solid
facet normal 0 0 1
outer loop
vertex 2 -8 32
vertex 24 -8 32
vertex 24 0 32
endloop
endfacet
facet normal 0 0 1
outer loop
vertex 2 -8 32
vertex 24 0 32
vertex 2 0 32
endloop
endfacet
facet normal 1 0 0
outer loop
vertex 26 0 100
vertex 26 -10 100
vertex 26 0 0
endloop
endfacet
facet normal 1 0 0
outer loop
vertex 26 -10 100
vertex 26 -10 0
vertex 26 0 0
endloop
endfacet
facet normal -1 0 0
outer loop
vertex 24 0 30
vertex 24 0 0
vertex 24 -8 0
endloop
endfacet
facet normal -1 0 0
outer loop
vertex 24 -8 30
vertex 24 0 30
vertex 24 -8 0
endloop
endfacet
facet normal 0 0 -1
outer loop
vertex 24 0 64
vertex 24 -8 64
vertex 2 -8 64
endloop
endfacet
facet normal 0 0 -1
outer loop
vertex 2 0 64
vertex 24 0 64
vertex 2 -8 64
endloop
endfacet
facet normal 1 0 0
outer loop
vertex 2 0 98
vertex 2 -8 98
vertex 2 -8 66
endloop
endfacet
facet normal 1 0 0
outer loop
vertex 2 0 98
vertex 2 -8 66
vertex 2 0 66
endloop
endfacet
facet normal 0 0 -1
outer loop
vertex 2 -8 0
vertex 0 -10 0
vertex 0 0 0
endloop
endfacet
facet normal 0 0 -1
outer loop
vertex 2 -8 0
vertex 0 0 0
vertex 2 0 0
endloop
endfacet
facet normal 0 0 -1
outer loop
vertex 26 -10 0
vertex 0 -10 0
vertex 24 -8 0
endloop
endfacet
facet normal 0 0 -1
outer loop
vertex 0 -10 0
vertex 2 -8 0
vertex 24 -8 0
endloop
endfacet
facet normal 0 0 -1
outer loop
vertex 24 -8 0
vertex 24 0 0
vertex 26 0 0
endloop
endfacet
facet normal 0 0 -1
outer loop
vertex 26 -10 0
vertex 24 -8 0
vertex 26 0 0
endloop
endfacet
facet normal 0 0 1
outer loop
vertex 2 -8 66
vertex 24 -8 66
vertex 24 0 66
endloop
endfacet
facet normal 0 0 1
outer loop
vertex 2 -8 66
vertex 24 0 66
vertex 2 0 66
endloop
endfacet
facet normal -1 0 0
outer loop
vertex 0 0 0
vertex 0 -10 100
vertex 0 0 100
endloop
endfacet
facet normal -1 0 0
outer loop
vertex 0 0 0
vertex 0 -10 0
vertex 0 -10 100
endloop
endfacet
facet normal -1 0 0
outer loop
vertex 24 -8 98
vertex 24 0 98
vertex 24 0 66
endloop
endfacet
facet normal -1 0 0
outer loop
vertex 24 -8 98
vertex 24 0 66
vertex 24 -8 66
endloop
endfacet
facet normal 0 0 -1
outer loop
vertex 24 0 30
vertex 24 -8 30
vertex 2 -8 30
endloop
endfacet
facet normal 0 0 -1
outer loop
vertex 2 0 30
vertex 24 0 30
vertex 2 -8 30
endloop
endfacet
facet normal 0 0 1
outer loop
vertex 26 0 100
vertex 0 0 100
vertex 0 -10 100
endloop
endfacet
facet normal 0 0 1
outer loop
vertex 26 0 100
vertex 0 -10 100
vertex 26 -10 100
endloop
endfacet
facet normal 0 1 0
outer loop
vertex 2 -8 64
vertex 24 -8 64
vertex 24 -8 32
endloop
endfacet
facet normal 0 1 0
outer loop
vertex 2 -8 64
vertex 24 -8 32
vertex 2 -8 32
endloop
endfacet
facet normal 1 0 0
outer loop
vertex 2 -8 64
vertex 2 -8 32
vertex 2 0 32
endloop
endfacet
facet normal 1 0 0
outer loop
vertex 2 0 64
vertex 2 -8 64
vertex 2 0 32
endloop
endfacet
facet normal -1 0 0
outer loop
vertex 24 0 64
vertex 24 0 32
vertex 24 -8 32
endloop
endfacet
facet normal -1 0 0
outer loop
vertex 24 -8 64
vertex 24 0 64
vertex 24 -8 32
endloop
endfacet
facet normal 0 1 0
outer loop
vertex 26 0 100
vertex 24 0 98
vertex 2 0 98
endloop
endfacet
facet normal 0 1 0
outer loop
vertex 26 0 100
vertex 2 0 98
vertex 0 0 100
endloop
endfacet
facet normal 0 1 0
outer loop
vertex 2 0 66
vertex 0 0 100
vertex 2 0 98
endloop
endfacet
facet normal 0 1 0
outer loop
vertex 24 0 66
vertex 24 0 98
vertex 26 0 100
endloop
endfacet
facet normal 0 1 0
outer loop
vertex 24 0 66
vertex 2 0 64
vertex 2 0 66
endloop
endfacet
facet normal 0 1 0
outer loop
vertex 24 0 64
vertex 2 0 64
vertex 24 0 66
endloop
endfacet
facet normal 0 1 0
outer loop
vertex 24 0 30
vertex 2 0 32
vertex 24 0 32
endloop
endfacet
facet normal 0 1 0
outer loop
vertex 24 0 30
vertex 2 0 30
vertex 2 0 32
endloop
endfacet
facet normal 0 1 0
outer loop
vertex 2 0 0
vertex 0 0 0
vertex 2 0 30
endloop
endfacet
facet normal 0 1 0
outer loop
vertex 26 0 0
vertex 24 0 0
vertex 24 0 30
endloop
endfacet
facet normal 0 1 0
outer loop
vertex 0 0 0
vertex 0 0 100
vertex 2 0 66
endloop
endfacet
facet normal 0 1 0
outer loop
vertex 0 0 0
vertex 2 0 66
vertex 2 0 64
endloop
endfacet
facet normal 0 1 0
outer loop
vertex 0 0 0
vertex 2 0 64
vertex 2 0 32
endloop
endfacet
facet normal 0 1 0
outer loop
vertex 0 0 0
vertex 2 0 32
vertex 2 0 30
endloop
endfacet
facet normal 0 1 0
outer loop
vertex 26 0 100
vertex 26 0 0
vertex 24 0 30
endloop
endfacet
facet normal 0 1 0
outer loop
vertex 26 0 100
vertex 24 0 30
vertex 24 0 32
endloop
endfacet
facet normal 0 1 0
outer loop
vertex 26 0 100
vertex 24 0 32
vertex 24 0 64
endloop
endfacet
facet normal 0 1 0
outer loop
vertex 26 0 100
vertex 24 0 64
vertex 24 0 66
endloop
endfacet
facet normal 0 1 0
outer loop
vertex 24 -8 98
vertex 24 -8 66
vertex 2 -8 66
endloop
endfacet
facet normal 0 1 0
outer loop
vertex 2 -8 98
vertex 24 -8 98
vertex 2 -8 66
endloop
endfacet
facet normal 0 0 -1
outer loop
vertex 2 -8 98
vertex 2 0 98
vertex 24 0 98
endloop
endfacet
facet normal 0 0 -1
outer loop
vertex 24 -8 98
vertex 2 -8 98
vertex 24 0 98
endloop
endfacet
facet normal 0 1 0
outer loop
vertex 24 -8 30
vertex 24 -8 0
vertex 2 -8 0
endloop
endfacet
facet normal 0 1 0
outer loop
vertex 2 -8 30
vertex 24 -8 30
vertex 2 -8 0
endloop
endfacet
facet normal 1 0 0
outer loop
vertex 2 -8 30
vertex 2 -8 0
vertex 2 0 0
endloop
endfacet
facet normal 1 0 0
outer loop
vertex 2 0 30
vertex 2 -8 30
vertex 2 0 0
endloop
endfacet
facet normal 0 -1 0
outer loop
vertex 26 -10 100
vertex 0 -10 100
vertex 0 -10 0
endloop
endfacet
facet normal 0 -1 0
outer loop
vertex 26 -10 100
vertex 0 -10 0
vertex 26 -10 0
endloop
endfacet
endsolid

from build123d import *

# Parameters (mm, degrees)
F1_DEPTH = 98
F2_W     = 26
F2_H     = 10
F3_DEPTH = 2
F4_W     = 22
F4_H     = 2
F5_DEPTH = 8


with BuildPart() as f1:
    # F0 (on Top) → F1 (new body)
    with BuildSketch(Plane.XY):
        Polygon((2, 0), (0, 0), (0, -10), (26, -10), (26, 0), (24, 0), (24, -8), (2, -8), align=None)
    extrude(amount=F1_DEPTH)

    # F2 (on face) → F3 (join)
    with BuildSketch(Plane.XY.offset(98)):
        with Locations((13, -5)):
            Rectangle(F2_W, F2_H)
    extrude(amount=F3_DEPTH)

    # F4 (on face) → F5 (join, through all)
    with BuildSketch(Plane(origin=(0, -8, 0), x_dir=(-1, 0, 0), z_dir=(0, 1, 0))):
        with Locations((-13, 65)):
            Rectangle(F4_W, F4_H)
        with Locations((-13, 31)):
            Rectangle(F4_W, F4_H)
    extrude(amount=F5_DEPTH)


solid = f1.part
